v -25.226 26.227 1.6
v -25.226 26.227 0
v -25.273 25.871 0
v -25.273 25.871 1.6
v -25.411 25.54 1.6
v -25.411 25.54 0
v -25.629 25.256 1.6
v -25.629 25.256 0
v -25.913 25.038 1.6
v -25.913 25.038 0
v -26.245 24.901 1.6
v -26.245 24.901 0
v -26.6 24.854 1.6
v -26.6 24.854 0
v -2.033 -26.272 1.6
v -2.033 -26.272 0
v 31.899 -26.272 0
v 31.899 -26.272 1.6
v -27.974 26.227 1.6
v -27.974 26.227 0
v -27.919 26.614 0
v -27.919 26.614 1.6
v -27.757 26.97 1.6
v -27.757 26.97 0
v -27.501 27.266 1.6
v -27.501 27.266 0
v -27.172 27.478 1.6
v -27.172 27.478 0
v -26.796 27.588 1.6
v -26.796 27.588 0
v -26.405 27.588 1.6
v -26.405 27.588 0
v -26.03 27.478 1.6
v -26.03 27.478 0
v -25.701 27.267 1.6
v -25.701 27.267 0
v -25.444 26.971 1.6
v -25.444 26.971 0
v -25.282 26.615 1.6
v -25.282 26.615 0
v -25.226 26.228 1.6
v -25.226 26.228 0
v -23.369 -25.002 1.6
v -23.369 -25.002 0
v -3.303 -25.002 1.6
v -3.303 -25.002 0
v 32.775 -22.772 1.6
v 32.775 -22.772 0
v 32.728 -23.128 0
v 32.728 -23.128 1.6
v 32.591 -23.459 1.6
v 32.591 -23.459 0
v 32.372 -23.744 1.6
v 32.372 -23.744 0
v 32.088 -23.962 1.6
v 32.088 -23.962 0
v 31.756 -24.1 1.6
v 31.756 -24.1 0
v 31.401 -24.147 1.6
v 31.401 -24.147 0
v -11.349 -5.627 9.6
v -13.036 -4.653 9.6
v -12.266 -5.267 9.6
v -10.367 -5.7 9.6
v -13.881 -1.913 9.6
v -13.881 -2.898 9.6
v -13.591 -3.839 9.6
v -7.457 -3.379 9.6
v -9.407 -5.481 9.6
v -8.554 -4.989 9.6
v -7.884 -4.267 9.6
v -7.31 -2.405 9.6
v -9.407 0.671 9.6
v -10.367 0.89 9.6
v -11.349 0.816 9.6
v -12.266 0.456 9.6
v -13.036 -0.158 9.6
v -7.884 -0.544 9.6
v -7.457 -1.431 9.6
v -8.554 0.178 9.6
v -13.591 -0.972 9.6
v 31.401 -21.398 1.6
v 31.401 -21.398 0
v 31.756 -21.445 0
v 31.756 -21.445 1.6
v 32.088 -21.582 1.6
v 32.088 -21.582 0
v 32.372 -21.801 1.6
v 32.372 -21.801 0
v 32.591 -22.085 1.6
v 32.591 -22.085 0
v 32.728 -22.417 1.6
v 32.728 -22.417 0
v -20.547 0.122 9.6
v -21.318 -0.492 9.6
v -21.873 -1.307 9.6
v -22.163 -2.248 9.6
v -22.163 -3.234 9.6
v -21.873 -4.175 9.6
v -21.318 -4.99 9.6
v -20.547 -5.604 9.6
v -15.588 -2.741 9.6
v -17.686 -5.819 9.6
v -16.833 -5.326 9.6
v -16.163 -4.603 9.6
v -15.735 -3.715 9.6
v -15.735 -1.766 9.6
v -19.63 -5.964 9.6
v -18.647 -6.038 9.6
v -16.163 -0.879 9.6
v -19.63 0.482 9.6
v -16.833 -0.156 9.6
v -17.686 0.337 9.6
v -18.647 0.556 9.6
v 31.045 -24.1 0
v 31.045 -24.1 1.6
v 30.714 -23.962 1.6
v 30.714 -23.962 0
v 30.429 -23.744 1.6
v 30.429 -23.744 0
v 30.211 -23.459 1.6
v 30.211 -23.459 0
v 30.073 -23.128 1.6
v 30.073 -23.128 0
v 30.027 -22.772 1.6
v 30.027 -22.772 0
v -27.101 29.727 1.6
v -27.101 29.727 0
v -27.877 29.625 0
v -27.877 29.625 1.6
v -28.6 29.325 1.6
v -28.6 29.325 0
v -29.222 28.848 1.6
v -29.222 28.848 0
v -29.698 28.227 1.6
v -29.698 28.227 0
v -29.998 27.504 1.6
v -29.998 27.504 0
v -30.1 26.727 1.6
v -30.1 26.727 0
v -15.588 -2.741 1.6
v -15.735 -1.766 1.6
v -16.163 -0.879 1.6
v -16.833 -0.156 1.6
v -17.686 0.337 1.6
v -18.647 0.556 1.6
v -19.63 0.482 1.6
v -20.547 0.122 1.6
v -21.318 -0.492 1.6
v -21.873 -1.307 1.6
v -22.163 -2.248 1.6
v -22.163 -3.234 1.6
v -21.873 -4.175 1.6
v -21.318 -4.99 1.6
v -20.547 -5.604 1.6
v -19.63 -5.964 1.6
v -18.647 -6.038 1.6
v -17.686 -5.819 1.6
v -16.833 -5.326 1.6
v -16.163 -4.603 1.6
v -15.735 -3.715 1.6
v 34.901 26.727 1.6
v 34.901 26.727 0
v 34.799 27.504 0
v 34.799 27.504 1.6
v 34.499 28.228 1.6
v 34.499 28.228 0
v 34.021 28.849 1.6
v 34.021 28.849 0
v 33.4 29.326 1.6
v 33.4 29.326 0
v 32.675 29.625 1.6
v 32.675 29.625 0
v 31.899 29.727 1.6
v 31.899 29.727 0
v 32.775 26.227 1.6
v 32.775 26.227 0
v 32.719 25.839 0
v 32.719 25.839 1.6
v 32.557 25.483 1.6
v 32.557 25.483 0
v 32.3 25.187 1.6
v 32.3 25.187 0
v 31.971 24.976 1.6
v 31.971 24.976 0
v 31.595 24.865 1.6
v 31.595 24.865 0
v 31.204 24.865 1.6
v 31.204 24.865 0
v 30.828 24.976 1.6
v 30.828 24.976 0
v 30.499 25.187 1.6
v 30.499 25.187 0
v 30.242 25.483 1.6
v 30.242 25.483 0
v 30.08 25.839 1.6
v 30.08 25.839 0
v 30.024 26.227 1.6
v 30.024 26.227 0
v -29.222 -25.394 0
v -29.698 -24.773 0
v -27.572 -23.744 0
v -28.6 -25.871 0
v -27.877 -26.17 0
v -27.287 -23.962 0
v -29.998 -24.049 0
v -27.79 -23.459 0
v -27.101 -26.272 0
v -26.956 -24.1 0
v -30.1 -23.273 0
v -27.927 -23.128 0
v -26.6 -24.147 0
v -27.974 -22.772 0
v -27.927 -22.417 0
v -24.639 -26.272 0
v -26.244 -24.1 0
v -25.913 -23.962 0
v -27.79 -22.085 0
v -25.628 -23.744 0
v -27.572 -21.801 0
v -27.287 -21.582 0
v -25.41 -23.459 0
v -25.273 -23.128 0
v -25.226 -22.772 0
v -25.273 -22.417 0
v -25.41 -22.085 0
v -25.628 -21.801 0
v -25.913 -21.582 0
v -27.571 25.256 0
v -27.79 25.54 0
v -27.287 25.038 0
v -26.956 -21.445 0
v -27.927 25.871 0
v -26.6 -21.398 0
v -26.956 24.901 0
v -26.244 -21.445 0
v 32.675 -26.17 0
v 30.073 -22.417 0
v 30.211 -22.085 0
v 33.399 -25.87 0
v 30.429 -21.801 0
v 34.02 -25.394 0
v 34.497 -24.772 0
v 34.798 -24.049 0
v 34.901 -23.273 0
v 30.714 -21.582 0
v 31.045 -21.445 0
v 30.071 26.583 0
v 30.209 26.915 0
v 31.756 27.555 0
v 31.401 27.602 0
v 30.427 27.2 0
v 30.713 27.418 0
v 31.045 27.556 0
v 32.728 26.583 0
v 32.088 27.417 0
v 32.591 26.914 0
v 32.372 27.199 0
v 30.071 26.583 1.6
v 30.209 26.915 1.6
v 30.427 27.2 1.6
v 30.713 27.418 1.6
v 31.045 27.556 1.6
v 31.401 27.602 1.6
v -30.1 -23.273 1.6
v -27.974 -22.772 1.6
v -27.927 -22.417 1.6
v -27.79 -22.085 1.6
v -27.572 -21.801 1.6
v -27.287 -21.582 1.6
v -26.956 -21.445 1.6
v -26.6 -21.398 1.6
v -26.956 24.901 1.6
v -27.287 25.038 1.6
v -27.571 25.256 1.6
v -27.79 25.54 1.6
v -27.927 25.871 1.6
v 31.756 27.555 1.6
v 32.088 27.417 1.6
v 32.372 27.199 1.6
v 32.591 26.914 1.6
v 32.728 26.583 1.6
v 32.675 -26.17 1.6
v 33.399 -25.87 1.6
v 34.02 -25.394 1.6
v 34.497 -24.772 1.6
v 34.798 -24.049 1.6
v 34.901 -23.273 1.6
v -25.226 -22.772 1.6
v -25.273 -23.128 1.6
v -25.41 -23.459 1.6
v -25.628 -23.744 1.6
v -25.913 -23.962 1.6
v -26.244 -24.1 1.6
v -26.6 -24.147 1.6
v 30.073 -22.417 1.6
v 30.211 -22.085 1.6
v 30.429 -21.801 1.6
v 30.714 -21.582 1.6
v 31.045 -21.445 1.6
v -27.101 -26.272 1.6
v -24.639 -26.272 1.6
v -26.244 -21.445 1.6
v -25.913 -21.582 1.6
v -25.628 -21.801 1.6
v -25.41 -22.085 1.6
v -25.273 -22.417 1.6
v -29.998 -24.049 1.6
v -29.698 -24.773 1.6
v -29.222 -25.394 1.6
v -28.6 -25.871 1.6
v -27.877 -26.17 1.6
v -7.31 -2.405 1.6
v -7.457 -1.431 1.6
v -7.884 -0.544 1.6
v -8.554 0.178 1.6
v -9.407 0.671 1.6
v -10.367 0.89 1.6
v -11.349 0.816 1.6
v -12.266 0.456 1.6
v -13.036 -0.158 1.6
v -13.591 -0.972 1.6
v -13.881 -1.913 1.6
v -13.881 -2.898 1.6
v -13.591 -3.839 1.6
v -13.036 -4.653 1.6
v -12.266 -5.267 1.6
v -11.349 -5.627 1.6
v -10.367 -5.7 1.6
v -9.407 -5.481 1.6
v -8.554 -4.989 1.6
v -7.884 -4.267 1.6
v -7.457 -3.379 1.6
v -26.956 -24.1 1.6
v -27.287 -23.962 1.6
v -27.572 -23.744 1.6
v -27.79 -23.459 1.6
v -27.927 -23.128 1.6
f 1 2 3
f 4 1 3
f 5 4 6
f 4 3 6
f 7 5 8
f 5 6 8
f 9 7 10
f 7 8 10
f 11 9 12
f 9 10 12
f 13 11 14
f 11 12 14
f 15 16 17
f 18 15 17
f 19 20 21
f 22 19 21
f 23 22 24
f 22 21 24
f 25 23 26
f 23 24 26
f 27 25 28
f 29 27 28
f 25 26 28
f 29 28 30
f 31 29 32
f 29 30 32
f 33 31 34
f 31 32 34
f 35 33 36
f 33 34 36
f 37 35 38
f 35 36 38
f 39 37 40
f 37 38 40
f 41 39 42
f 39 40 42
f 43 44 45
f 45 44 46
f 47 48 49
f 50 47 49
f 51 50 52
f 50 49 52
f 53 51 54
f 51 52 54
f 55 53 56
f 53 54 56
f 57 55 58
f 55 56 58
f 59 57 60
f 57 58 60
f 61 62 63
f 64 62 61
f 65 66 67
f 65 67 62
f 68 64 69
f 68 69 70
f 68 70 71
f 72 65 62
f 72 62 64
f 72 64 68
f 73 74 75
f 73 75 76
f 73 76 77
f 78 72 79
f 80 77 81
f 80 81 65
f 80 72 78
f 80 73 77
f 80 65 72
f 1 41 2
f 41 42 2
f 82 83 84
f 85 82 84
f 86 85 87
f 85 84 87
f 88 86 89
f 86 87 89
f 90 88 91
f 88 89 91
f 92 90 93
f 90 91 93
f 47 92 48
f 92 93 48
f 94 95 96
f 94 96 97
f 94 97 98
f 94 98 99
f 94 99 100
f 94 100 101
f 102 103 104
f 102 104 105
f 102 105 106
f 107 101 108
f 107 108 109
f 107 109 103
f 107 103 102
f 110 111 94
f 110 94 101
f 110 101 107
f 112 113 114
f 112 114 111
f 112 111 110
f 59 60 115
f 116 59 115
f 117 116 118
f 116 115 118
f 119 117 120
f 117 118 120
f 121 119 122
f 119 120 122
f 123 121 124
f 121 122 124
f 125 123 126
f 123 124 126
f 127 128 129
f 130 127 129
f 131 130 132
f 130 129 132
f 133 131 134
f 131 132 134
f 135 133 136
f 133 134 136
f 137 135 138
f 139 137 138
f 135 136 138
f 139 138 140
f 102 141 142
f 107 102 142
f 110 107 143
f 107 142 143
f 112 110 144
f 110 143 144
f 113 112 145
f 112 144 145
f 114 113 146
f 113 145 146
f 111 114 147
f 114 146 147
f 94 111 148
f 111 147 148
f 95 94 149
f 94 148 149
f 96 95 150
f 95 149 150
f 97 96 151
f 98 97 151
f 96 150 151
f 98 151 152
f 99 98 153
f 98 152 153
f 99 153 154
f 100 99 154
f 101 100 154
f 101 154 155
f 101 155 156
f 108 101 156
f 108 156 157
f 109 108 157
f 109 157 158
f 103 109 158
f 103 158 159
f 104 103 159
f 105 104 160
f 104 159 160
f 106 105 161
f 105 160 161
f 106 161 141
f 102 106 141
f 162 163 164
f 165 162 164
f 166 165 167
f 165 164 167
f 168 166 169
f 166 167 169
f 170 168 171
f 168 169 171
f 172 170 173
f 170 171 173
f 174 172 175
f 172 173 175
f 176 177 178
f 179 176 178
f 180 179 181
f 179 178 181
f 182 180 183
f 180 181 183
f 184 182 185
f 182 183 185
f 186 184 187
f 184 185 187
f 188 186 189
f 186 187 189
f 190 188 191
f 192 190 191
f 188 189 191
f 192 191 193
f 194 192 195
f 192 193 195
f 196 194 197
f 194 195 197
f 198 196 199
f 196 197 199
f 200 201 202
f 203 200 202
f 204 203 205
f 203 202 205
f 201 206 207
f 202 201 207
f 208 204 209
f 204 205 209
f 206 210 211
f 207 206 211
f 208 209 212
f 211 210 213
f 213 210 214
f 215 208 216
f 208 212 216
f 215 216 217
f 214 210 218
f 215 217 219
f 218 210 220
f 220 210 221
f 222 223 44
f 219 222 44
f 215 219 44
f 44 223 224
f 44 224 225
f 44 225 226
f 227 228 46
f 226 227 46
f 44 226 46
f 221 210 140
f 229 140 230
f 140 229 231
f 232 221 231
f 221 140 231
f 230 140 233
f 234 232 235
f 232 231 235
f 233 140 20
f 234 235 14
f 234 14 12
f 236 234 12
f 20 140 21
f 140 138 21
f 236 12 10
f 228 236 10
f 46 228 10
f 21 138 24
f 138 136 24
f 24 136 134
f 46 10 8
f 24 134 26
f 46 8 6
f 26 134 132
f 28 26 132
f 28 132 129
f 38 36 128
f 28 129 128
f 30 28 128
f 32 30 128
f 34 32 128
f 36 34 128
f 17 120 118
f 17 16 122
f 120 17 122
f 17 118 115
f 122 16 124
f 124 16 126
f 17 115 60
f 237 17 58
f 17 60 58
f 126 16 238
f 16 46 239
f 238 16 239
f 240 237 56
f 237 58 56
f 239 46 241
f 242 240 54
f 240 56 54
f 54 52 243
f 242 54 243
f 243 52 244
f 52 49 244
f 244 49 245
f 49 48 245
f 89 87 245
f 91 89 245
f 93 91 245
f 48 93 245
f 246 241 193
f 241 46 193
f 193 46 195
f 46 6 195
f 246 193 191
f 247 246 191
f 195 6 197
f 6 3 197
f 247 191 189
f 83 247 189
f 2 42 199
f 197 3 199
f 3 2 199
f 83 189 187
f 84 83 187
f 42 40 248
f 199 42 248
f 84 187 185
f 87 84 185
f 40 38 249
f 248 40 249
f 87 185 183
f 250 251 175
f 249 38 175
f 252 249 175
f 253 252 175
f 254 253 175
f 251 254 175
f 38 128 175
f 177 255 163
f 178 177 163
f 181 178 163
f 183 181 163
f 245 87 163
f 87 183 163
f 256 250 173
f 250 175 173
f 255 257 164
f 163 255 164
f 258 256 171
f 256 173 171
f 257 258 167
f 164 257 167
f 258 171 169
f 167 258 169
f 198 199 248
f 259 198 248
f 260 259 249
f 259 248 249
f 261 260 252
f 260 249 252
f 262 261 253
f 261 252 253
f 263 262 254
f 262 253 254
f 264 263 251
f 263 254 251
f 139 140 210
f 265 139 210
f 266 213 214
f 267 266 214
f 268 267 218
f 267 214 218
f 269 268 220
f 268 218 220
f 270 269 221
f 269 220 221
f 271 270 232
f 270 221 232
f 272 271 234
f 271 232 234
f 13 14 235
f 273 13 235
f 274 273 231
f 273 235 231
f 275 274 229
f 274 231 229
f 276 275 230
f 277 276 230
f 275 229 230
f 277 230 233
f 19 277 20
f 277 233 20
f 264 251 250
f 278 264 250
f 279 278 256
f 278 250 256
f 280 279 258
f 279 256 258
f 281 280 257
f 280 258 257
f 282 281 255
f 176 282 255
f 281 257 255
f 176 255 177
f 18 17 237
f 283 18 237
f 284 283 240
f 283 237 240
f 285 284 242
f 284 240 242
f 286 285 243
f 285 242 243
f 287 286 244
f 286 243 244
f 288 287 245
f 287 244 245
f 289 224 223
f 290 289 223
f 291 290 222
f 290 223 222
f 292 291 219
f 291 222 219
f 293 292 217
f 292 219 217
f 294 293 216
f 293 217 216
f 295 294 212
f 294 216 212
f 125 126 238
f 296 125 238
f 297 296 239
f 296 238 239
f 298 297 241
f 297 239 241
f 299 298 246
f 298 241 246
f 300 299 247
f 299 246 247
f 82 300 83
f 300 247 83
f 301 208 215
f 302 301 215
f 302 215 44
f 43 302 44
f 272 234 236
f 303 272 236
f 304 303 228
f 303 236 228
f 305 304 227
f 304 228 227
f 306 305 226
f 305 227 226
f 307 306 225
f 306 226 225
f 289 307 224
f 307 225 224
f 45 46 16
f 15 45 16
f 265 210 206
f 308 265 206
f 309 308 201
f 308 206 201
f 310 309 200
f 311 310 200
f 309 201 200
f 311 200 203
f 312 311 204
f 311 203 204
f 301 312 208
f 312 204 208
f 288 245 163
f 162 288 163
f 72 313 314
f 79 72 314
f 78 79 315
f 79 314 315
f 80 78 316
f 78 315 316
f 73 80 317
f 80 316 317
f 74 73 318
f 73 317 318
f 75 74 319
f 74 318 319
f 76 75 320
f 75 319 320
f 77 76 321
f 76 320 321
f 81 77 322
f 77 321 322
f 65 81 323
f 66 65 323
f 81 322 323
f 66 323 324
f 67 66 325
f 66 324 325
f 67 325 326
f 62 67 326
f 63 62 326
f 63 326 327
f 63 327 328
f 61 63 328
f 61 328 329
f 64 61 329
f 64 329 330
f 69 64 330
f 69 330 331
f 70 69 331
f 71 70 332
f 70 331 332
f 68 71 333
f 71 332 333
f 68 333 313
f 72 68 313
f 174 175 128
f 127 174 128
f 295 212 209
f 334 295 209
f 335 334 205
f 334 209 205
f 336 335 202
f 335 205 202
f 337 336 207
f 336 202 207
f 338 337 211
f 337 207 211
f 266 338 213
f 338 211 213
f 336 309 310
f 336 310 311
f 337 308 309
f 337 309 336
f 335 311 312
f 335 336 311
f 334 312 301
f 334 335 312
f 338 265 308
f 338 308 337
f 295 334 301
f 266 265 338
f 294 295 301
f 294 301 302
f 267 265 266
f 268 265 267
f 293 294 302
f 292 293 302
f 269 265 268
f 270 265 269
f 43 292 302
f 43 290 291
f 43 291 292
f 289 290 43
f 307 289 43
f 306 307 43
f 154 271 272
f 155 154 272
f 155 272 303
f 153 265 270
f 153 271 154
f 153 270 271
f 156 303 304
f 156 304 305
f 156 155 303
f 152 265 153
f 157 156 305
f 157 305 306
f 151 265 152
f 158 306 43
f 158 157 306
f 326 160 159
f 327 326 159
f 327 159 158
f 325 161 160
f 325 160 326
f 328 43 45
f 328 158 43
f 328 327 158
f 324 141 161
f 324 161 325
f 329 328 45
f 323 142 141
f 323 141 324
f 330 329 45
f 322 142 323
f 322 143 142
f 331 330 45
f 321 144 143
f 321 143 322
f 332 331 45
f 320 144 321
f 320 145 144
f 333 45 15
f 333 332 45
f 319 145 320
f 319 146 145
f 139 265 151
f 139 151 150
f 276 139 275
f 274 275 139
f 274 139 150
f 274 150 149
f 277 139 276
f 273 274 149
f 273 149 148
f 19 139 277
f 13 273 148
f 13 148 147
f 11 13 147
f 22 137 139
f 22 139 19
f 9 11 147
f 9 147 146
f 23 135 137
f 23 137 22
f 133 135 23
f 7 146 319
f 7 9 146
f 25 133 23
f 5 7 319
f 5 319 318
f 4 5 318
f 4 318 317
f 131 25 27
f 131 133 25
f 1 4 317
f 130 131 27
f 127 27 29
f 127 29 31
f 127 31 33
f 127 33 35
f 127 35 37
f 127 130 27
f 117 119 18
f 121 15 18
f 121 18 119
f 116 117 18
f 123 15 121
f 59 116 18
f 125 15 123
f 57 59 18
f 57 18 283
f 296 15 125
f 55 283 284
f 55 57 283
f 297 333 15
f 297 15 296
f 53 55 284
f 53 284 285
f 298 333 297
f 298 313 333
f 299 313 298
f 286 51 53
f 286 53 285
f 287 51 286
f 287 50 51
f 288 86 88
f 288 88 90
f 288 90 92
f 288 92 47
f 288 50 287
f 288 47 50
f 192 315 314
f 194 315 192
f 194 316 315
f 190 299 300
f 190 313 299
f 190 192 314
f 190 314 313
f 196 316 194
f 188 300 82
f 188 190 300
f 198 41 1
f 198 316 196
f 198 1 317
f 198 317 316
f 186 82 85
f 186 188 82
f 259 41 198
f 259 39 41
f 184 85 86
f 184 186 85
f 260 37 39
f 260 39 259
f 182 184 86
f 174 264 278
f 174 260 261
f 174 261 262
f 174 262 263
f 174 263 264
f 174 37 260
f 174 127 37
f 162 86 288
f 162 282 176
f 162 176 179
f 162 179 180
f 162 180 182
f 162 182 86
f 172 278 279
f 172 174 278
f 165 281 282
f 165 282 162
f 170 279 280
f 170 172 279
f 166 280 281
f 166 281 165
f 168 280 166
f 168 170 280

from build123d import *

# Parameters (mm, degrees)
F1_DEPTH = 1.6
F2_R     = 3.3061205596
F2_R_2   = 3.3042251001
F3_DEPTH = 8


# Not quite as in the source:
# - ends of sketch curves that miss each other by under 0.0002 mm in the source are joined


with BuildPart() as f1:
    # F0 (on Top) → F1 (new body)
    with BuildSketch(Plane.XY):
        with BuildLine():
            Line((-30.10027, 26.72715), (-30.10027, -23.27275))
            ThreePointArc((-30.10027, -23.27275), (-29.2216664958, -25.3938864958), (-27.10053, -26.27249))
            Line((-27.10053, -26.27249), (-24.63927, -26.27249))
            Line((-24.63927, -26.27249), (-23.36927, -25.00249))
            Line((-23.36927, -25.00249), (-3.30327, -25.00249))
            Line((-3.30327, -25.00249), (-2.03327, -26.27249))
            Line((-2.03327, -26.27249), (31.89859, -26.27249))
            ThreePointArc((31.89859, -26.27249), (34.020096129, -25.3935121782), (34.9008668601, -23.2727499955))
            Line((34.9008668601, -23.2727499955), (34.90087, 26.72715))
            ThreePointArc((34.90087, 26.72715), (34.0213682803, 28.8491843311), (31.8985900009, 29.7268889246))
            Line((31.8985900009, 29.7268889246), (-27.10053, 29.72689))
            ThreePointArc((-27.10053, 29.72689), (-29.2216664958, 28.8482864958), (-30.10027, 26.72715))
        make_face()
        with BuildLine():
            ThreePointArc((-26.60015, -24.14651), (-27.5718137123, -23.7440337123), (-27.97429, -22.77237))
            ThreePointArc((-27.97429, -22.77237), (-27.5718137123, -21.8007062877), (-26.60015, -21.39823))
            ThreePointArc((-26.60015, -21.39823), (-25.6284862877, -21.8007062877), (-25.22601, -22.77237))
            ThreePointArc((-25.22601, -22.77237), (-25.6284862877, -23.7440337123), (-26.60015, -24.14651))
        make_face(mode=Mode.SUBTRACT)
        with BuildLine():
            ThreePointArc((31.40075, -24.14651), (30.4290862877, -23.7440337123), (30.02661, -22.77237))
            ThreePointArc((30.02661, -22.77237), (30.4290862877, -21.8007062877), (31.40075, -21.39823))
            ThreePointArc((31.40075, -21.39823), (32.3724137123, -21.8007062877), (32.77489, -22.77237))
            ThreePointArc((32.77489, -22.77237), (32.3724137123, -23.7440337123), (31.40075, -24.14651))
        make_face(mode=Mode.SUBTRACT)
        with BuildLine():
            ThreePointArc((-26.60015, 24.8538994131), (-27.5713650107, 25.2559269636), (-27.97429, 26.22677))
            ThreePointArc((-27.97429, 26.22677), (-27.5722630364, 27.1992550107), (-26.60015, 27.6021805869))
            ThreePointArc((-26.60015, 27.6021805869), (-25.6284858727, 27.1997041273), (-25.2260094131, 26.22804))
            ThreePointArc((-25.2260094131, 26.22804), (-25.2260095598, 26.2274049999), (-25.22601, 26.22677))
            ThreePointArc((-25.22601, 26.22677), (-25.6289349893, 25.2559269636), (-26.60015, 24.8538994131))
        make_face(mode=Mode.SUBTRACT)
        with BuildLine():
            ThreePointArc((32.77489, 26.22677), (31.39948, 24.85136), (30.02407, 26.22677))
            ThreePointArc((30.02407, 26.22677), (30.4273673786, 27.1997806471), (31.40075, 27.6021794137))
            ThreePointArc((31.40075, 27.6021794137), (32.3724906471, 27.1988826214), (32.77489, 26.22677))
        make_face(mode=Mode.SUBTRACT)
    extrude(amount=F1_DEPTH)

    # F2 (on face) → F3 (join)
    with BuildSketch(Plane.XY.offset(1.6)):
        with Locations((-18.8942644745, -2.7409724426)):
            Circle(F2_R)
        with Locations((-10.6140207499, -2.4052869994)):
            Circle(F2_R_2)
    extrude(amount=F3_DEPTH)


solid = f1.part
